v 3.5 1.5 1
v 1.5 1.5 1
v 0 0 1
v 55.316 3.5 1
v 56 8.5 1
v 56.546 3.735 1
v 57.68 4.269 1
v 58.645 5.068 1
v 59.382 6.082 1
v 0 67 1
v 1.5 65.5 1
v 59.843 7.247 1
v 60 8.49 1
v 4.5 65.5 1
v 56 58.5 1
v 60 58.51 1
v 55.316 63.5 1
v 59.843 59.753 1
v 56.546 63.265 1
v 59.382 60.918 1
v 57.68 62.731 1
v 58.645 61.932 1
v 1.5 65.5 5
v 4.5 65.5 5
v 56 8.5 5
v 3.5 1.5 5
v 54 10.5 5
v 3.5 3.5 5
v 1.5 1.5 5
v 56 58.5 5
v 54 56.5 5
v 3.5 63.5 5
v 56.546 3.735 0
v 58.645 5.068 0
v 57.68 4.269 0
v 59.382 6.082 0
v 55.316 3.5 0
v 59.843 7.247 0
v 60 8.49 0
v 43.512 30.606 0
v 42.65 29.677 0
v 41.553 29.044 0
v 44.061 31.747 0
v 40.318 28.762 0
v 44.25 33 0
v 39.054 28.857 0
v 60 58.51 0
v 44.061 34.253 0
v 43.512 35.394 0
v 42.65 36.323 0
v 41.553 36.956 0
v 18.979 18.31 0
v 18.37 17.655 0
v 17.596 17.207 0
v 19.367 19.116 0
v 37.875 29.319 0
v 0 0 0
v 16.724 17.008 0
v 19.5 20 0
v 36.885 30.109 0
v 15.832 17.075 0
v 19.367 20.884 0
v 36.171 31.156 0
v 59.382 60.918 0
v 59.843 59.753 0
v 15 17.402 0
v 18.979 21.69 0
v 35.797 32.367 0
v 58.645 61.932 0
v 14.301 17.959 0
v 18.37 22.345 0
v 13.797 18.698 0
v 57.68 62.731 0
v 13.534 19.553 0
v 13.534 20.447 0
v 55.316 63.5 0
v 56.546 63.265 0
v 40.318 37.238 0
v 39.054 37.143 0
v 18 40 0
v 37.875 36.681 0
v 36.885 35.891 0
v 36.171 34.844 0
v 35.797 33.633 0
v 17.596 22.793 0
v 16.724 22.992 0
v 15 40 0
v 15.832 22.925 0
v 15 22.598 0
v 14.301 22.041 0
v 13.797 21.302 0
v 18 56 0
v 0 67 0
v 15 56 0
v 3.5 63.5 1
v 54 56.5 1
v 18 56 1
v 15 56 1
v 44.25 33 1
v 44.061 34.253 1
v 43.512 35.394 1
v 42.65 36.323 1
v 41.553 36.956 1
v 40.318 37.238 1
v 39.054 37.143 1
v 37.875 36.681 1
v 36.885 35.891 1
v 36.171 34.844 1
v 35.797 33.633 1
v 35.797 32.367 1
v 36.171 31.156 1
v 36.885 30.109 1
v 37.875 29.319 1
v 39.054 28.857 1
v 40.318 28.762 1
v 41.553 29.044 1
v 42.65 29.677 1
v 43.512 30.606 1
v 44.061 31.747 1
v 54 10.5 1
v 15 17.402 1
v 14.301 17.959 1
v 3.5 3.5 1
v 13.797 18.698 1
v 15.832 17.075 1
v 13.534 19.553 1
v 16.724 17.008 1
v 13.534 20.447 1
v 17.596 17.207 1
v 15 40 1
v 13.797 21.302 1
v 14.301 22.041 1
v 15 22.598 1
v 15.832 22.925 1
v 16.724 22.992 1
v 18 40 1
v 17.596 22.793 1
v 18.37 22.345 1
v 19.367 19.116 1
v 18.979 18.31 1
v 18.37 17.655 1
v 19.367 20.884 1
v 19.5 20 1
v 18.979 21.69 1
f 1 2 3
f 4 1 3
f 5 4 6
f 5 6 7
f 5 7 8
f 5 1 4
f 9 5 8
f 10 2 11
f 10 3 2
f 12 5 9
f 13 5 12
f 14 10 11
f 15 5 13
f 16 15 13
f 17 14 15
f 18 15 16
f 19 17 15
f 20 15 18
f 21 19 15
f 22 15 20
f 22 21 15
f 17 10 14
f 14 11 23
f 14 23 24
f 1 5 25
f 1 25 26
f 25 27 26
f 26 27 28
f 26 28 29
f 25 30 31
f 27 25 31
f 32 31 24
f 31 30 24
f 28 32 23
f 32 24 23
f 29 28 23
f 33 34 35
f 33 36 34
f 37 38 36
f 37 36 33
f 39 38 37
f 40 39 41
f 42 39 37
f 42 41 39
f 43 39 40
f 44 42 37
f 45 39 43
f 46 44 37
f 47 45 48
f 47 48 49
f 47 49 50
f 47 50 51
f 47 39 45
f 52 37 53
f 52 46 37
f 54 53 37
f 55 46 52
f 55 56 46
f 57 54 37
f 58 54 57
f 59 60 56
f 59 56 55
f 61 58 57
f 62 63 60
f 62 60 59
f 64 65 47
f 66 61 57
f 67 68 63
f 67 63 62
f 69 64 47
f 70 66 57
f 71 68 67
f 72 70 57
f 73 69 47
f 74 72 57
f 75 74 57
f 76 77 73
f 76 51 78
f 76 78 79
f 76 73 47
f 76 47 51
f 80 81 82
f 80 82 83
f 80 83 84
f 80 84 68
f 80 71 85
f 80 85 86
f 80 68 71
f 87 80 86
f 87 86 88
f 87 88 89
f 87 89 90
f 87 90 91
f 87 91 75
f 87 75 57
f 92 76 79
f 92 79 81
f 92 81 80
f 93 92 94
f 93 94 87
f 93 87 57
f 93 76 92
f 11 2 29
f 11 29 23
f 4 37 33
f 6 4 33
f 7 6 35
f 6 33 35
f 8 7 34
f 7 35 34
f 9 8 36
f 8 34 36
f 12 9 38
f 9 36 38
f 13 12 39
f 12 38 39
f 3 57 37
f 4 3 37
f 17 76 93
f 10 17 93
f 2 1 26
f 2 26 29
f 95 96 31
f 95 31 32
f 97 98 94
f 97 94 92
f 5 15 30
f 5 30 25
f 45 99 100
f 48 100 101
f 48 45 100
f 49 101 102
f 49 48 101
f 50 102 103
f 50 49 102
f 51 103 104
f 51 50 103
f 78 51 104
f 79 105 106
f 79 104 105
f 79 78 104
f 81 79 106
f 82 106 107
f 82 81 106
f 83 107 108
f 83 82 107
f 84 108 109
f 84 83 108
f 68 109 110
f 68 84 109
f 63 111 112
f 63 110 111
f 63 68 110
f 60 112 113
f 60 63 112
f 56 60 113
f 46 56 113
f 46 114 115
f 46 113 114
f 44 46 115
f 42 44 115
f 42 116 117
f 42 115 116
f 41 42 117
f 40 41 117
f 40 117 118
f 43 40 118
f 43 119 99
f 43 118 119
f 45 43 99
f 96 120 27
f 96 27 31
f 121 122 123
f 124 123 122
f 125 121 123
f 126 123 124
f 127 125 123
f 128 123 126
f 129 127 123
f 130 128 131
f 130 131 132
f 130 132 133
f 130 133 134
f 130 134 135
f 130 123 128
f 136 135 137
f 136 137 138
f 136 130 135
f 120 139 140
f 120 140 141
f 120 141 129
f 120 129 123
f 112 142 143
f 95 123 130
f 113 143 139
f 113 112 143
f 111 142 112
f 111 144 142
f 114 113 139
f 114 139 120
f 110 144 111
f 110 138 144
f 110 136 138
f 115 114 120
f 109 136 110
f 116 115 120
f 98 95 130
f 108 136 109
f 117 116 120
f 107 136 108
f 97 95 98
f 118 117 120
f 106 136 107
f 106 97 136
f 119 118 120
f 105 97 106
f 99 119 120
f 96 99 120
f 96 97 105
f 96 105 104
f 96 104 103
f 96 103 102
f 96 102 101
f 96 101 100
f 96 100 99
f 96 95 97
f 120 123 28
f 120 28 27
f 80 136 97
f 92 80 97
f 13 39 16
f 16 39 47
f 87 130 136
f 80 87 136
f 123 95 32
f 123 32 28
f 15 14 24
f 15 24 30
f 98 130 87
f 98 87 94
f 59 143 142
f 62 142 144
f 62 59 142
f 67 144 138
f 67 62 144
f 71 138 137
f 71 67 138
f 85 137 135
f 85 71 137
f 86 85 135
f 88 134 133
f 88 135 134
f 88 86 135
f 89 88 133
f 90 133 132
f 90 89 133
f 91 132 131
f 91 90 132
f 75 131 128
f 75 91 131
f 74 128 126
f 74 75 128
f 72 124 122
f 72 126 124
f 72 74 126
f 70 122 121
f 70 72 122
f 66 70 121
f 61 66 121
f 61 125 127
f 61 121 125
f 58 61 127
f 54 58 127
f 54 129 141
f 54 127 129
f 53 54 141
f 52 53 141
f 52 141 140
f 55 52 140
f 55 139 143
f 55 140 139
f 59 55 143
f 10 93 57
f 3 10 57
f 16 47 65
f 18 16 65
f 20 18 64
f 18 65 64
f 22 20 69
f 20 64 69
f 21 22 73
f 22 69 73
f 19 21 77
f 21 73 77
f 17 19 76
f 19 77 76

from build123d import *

# Parameters (mm, degrees)
PAD001_DEPTH  = 1
PAD_DEPTH     = 5
SKETCH002_R   = 4.25
SKETCH002_R_2 = 3
SKETCH002_W   = 3
SKETCH002_H   = 16
POCKET_DEPTH  = 5


with BuildPart() as part:
    # Sketch → Pad001 (new body)
    with BuildSketch(Plane.XY):
        with BuildLine():
            Line((0, 67), (0, 0))
            Line((0, 0), (55.315734, 3.5))
            ThreePointArc((55.315734, 3.5), (58.645454, 5.067936), (60, 8.490021))
            Line((60, 8.490021), (60, 58.509979))
            ThreePointArc((60, 58.509979), (58.645454, 61.932064), (55.315734, 63.5))
            Line((55.315734, 63.5), (0, 67))
        make_face()
    extrude(amount=PAD001_DEPTH)

    # Sketch001 → Pad (join)
    with BuildSketch(Plane.XY):
        Polygon((1.5, 65.5), (4.5, 65.5), (56, 58.5), (56, 8.5), (3.5, 1.5), (1.5, 1.5), align=None)
        Polygon((3.5, 63.5), (3.5, 3.5), (54, 10.5), (54, 56.5), align=None, mode=Mode.SUBTRACT)
    extrude(amount=PAD_DEPTH)

    # Sketch002 → Pocket (cut, symmetric)
    with BuildSketch(Plane.XY):
        with Locations((40, 33)):
            Circle(SKETCH002_R)
        with Locations((16.5, 20)):
            Circle(SKETCH002_R_2)
        with Locations((16.5, 48)):
            Rectangle(SKETCH002_W, SKETCH002_H)
    extrude(amount=POCKET_DEPTH, both=True, mode=Mode.SUBTRACT)


solid = part.part
